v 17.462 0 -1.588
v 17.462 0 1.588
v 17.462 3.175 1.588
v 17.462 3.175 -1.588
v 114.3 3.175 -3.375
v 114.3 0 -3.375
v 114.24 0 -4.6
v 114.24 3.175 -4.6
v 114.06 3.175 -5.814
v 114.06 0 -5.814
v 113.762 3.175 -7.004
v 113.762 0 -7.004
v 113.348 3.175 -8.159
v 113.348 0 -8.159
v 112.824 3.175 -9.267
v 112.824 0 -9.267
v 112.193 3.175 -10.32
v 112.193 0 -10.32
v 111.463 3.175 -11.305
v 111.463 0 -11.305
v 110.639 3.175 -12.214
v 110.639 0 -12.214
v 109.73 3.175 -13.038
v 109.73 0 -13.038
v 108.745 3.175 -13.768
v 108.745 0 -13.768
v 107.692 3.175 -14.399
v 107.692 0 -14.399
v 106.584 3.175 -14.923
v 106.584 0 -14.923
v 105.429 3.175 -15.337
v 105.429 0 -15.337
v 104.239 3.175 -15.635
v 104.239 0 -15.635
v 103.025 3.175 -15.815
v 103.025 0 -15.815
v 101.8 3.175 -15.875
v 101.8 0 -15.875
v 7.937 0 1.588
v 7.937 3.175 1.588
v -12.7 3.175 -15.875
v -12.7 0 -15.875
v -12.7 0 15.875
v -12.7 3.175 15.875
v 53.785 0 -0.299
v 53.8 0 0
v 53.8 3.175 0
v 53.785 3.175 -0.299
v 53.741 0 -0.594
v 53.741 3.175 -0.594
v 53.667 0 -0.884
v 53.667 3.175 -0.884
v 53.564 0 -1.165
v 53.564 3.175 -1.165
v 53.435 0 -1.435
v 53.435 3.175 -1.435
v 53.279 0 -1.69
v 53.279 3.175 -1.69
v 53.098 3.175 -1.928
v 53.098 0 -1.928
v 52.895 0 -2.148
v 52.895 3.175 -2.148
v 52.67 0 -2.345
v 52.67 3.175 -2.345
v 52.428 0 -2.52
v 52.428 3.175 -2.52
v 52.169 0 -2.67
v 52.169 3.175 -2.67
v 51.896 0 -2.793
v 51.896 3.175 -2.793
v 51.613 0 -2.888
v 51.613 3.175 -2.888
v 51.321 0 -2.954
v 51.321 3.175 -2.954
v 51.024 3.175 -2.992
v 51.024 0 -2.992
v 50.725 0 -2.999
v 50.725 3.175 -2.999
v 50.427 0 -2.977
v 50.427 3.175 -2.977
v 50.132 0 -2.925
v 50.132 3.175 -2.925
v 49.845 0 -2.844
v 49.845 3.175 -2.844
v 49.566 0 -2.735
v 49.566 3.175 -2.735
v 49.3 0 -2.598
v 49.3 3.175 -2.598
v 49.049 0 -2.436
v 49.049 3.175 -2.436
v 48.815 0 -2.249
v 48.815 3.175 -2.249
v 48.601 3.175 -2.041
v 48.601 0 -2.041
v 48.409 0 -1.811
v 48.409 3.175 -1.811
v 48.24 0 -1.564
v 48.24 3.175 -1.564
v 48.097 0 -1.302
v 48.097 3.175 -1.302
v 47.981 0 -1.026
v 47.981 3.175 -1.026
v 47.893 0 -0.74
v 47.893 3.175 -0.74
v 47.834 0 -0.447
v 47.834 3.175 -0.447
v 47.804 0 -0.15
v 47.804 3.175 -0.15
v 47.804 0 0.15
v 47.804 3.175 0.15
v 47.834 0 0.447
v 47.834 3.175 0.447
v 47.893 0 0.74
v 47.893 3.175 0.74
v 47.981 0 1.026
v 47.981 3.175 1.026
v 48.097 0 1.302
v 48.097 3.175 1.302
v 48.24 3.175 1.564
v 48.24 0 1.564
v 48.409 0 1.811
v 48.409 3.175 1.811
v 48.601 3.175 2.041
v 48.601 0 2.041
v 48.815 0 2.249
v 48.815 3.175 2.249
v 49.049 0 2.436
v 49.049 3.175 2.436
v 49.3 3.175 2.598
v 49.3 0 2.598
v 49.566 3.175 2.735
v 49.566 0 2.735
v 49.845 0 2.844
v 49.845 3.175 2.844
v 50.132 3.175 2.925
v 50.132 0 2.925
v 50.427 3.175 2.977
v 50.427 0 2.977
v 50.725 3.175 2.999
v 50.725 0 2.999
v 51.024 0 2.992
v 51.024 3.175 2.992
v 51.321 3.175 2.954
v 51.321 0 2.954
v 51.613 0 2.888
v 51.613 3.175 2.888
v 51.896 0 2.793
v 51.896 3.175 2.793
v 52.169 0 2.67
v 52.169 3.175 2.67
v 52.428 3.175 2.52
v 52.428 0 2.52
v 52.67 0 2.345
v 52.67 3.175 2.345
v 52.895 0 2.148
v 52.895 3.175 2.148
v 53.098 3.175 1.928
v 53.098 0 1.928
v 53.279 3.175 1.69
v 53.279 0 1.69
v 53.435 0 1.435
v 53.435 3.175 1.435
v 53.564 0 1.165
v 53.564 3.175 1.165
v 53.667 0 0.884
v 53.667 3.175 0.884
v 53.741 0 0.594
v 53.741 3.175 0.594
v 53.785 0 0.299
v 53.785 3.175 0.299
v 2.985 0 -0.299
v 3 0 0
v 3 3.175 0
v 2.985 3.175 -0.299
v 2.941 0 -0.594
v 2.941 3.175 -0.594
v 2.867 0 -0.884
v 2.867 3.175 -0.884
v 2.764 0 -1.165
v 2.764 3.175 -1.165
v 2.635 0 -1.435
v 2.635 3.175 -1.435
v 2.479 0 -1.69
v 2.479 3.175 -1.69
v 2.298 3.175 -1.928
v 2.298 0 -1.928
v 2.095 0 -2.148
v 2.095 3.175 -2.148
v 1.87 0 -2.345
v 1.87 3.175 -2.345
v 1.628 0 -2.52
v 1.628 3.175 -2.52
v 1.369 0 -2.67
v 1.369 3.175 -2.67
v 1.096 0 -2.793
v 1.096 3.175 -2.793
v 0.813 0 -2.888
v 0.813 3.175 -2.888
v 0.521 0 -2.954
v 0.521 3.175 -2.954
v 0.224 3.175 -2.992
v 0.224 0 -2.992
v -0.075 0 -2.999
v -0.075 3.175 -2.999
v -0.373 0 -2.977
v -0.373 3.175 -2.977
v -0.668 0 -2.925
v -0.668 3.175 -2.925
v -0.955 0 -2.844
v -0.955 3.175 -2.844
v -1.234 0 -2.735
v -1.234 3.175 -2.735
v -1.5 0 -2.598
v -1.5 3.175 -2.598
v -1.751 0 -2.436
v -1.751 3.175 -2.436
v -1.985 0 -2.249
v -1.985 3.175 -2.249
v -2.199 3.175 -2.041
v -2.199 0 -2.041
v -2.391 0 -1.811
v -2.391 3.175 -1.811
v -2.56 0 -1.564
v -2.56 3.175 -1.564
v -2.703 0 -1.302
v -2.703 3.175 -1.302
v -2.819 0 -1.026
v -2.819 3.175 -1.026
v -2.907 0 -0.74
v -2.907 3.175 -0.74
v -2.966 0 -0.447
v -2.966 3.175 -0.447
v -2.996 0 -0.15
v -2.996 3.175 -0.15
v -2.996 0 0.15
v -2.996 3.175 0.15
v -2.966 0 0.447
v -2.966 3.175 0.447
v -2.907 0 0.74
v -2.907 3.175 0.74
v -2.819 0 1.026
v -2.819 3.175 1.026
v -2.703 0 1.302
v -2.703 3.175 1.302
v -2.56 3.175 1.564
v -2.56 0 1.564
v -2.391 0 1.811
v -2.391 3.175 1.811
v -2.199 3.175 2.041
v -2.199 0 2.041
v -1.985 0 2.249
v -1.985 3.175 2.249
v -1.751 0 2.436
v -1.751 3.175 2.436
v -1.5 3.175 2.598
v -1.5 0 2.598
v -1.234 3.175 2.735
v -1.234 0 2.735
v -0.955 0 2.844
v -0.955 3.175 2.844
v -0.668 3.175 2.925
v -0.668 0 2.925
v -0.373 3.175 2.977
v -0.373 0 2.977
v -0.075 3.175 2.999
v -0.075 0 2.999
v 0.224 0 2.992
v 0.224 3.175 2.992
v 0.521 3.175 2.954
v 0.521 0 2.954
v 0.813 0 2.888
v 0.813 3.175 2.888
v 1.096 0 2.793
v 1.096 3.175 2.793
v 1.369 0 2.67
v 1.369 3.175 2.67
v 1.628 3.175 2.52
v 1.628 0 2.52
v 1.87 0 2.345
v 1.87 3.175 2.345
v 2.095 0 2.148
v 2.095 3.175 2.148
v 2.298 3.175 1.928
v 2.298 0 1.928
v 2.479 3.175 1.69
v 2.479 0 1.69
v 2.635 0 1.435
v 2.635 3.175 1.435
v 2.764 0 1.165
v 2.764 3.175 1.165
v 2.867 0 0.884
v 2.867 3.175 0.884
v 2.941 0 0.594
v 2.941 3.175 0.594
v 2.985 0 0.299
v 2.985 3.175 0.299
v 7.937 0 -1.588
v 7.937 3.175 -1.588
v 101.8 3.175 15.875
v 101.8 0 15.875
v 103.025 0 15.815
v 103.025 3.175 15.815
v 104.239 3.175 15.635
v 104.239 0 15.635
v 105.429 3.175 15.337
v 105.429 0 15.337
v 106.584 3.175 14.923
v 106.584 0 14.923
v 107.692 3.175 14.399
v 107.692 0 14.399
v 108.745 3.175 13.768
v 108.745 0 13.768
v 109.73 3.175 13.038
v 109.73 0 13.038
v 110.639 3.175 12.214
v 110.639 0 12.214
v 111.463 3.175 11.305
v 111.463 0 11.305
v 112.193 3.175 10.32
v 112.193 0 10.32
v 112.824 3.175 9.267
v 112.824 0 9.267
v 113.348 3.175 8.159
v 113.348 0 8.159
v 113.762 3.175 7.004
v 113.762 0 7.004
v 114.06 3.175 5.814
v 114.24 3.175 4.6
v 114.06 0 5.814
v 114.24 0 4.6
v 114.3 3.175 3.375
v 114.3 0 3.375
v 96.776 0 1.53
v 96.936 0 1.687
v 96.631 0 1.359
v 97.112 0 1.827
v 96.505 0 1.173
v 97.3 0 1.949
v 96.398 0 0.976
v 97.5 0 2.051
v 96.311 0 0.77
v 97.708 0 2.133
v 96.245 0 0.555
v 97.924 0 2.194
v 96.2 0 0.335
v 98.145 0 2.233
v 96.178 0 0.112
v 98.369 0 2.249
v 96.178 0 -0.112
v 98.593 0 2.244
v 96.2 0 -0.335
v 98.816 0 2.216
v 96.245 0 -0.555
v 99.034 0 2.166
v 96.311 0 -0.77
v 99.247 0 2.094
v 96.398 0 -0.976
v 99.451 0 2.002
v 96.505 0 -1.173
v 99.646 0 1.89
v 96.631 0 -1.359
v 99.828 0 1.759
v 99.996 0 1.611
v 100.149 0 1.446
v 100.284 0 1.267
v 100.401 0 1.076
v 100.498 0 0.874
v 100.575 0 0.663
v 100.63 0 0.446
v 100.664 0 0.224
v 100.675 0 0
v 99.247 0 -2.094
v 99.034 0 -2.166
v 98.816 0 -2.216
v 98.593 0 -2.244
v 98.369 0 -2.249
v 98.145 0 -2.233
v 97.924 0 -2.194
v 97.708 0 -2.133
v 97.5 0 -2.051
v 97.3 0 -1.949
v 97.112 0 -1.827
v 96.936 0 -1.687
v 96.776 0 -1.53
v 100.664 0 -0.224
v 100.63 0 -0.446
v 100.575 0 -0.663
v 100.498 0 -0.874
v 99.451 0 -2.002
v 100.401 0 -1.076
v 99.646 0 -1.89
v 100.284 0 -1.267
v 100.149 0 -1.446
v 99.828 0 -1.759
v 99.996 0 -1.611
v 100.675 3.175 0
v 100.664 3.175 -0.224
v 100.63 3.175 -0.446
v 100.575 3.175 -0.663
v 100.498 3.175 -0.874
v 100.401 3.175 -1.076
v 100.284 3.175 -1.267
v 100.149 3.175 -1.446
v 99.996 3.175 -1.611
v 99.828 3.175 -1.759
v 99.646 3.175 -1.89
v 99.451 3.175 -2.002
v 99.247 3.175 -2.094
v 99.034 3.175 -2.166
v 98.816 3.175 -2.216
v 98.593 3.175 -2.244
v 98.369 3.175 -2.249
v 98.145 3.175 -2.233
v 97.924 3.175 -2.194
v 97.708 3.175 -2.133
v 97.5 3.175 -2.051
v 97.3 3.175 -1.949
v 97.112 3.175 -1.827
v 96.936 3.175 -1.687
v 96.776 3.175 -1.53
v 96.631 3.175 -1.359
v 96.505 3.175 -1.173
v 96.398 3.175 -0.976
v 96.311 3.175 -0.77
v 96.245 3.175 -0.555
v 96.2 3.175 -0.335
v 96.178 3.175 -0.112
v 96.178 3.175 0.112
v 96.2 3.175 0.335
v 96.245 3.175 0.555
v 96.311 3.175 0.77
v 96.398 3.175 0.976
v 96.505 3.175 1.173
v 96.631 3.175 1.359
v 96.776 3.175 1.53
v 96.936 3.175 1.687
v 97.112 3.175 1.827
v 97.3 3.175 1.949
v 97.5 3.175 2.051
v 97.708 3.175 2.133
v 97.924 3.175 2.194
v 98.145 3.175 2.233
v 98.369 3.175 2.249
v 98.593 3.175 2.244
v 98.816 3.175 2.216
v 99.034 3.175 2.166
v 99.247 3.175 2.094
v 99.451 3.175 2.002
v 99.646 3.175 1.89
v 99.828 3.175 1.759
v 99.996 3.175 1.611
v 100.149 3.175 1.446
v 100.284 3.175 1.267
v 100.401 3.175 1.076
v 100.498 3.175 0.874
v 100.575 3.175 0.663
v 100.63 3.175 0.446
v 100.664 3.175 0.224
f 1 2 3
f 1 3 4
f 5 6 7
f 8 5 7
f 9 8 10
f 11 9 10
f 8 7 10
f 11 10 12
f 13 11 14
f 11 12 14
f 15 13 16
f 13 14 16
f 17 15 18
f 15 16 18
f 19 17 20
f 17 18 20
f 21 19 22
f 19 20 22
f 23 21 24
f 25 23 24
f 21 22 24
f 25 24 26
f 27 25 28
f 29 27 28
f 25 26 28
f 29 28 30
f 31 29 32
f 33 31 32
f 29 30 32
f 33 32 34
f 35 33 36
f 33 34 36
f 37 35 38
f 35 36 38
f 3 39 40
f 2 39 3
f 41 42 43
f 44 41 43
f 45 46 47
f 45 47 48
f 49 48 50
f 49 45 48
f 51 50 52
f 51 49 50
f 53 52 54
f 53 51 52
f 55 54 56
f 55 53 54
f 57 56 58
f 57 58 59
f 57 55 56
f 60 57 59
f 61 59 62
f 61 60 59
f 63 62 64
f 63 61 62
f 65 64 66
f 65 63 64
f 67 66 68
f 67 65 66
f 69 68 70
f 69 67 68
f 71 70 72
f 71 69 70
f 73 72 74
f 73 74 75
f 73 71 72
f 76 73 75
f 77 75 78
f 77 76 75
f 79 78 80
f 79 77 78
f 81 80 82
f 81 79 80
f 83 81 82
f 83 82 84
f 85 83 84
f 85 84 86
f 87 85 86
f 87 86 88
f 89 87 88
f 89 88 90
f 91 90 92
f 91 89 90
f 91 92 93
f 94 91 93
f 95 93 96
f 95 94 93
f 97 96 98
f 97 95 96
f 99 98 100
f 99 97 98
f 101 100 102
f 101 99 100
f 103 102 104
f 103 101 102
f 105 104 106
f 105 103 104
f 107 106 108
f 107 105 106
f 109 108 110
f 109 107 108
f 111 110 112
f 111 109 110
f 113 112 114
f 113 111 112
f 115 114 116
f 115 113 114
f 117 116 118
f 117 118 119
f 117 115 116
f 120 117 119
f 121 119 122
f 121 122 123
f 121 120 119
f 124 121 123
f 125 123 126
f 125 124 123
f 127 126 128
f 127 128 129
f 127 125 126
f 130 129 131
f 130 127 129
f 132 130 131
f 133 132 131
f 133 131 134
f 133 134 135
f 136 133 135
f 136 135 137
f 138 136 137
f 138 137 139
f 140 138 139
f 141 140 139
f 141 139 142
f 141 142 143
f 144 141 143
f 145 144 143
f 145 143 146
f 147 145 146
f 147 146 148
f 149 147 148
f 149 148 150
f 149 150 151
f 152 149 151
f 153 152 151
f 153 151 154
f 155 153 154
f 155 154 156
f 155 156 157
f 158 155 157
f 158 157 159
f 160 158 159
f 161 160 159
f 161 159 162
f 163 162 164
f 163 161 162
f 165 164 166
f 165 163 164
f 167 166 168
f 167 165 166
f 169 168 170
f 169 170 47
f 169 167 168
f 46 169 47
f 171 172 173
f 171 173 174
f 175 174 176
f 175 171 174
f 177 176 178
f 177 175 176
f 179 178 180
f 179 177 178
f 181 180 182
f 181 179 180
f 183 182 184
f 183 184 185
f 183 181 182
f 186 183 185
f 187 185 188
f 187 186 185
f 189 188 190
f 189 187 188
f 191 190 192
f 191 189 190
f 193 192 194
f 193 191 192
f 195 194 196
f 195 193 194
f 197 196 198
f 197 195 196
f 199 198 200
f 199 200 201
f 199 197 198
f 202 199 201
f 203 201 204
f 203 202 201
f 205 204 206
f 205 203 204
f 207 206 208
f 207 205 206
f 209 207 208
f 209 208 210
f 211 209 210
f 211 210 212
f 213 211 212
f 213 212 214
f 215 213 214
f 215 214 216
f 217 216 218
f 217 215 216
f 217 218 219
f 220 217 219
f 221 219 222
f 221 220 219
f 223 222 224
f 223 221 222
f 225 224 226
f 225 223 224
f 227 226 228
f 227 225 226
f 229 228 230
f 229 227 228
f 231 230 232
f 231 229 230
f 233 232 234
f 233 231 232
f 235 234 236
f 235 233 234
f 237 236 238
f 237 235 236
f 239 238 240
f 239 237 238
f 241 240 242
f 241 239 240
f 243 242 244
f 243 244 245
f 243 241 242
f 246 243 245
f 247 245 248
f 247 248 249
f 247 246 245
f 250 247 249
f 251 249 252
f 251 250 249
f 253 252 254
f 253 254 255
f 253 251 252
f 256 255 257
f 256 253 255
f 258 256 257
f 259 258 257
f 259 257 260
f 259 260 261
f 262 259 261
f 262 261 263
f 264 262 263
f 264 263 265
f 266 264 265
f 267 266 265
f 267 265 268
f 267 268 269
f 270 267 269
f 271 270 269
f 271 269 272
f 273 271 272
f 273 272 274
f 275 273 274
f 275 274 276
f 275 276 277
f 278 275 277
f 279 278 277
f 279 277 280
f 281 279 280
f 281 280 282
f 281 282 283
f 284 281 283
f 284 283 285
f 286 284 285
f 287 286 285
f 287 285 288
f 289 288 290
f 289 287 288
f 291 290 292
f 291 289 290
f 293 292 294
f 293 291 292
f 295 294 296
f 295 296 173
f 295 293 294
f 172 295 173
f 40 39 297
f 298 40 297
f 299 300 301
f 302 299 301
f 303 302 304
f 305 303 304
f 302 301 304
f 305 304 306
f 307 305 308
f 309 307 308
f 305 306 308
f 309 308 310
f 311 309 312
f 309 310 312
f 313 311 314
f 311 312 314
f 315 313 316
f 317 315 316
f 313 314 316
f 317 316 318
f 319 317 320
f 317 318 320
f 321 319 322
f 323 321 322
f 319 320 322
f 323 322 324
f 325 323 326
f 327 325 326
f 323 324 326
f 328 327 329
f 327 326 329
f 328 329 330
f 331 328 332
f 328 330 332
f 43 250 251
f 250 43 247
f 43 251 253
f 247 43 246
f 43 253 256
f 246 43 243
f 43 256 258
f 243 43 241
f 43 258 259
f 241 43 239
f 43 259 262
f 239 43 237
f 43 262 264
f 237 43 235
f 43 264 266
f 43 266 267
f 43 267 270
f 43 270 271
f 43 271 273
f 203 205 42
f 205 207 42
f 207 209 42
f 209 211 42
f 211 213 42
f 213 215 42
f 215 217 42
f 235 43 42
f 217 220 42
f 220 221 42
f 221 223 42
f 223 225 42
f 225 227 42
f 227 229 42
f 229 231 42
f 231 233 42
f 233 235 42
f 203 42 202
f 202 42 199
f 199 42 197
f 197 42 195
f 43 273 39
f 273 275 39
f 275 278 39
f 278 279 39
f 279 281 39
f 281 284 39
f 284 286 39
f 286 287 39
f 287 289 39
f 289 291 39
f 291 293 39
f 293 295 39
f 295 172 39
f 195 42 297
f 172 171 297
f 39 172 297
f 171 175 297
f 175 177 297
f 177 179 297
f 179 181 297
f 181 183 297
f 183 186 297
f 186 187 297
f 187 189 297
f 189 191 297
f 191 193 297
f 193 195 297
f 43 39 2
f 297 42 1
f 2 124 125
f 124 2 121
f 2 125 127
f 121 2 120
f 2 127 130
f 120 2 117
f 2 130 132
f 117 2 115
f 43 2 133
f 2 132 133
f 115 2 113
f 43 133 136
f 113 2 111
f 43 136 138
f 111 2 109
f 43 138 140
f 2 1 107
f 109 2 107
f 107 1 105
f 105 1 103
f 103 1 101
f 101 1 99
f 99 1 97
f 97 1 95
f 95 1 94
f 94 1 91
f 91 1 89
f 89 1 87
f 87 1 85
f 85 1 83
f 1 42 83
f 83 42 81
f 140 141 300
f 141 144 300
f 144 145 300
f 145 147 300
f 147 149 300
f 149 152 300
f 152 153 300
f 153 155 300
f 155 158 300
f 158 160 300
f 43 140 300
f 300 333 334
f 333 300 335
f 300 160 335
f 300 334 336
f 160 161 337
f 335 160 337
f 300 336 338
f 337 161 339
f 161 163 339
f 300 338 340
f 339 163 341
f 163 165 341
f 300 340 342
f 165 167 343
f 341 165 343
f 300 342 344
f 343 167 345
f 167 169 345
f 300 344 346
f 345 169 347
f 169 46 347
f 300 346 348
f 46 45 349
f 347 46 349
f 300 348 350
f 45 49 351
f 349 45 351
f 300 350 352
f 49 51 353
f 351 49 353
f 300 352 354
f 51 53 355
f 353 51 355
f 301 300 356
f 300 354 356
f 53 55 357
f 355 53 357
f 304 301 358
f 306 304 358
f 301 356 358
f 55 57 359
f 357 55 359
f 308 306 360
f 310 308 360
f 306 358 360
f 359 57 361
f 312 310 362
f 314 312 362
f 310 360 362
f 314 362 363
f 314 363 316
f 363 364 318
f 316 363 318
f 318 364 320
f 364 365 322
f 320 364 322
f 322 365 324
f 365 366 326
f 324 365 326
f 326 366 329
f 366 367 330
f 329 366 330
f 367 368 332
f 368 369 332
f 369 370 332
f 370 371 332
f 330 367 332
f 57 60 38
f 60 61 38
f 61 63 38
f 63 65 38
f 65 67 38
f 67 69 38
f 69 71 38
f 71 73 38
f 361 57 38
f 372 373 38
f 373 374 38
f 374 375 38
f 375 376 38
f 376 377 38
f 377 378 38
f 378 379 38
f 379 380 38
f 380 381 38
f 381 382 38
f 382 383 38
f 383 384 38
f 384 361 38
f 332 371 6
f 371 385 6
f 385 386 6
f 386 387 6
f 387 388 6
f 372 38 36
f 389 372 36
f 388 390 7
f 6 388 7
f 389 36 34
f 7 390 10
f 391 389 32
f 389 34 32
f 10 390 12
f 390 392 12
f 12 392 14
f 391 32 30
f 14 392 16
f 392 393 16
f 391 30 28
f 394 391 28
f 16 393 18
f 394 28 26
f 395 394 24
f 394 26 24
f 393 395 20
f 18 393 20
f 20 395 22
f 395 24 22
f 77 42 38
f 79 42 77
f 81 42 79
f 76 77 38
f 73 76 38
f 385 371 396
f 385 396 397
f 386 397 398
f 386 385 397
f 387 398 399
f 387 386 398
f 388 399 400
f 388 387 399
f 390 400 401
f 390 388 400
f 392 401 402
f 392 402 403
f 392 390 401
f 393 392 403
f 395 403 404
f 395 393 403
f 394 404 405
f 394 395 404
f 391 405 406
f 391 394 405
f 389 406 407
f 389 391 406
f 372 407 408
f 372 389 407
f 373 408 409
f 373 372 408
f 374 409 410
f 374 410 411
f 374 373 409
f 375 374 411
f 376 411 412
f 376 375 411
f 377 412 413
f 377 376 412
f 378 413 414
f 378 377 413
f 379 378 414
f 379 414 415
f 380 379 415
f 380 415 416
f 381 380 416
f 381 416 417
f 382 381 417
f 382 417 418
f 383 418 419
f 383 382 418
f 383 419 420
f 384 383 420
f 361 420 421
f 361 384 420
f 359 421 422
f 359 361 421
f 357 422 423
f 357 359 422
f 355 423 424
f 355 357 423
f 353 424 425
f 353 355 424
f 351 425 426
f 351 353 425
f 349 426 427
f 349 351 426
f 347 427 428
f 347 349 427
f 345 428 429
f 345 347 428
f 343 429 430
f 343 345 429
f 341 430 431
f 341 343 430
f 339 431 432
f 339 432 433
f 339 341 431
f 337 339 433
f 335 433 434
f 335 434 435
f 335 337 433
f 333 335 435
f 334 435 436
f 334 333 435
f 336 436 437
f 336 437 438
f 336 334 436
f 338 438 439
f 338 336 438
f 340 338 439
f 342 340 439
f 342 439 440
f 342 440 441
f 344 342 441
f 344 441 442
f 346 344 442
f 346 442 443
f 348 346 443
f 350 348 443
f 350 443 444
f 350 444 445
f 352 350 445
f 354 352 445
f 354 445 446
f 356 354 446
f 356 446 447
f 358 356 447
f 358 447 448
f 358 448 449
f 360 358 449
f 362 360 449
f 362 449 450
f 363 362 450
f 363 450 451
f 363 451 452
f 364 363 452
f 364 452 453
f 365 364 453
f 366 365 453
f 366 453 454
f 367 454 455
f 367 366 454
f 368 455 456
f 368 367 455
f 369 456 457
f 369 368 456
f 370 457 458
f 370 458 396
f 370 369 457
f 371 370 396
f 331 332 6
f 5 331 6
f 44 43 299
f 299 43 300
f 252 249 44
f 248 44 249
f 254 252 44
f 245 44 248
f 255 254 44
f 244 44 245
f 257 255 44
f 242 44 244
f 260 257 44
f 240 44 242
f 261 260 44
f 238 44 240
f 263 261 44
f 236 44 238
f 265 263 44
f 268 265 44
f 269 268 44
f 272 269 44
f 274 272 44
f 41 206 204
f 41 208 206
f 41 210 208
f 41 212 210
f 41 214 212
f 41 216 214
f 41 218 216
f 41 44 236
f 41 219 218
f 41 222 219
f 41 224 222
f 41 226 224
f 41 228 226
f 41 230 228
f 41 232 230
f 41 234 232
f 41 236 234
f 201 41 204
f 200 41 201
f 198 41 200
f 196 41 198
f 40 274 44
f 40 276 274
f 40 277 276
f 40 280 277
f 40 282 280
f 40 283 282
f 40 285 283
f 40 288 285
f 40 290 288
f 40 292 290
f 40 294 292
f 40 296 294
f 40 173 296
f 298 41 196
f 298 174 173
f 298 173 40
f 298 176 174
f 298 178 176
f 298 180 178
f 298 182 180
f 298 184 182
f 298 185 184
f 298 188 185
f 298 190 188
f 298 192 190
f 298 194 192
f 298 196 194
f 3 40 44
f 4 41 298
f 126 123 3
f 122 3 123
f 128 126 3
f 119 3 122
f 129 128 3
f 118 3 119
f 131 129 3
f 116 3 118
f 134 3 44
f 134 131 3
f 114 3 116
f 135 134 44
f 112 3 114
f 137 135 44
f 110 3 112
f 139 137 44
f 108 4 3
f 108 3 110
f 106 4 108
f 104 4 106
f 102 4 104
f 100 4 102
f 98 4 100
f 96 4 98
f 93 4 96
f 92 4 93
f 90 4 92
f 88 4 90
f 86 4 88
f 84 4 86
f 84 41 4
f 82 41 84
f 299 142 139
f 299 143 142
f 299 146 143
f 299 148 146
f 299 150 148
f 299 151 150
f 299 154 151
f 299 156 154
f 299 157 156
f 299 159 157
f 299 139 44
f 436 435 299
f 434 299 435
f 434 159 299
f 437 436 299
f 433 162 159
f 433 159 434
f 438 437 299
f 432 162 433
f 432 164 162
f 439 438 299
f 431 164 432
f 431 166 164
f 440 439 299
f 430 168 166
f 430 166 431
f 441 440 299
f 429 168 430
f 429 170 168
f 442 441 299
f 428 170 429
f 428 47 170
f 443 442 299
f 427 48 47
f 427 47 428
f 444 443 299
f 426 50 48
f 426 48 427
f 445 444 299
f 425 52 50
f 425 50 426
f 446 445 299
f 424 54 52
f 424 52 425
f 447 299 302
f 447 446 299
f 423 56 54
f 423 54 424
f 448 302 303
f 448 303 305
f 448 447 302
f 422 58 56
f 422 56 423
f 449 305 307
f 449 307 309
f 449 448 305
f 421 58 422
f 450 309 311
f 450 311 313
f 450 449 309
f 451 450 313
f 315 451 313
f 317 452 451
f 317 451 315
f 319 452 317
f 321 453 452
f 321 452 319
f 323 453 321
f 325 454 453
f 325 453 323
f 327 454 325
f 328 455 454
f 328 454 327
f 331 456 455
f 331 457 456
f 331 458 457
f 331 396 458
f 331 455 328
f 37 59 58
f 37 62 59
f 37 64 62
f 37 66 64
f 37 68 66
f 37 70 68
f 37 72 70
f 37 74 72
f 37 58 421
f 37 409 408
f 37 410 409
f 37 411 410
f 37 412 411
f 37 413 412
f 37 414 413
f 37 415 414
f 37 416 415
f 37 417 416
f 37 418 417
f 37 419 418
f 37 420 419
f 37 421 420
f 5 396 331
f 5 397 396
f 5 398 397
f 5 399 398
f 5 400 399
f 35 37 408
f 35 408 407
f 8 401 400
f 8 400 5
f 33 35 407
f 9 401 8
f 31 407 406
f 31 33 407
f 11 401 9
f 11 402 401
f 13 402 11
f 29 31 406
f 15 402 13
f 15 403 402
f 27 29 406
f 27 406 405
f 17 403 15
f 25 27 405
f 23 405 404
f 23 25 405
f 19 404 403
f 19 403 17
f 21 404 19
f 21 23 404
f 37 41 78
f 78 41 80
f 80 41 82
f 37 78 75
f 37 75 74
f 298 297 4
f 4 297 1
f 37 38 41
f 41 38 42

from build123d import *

# Parameters (mm, degrees)
SKETCH1_R           = 3
SKETCH1_R_2         = 2.25
SKETCH1_W           = 9.525
SKETCH1_H           = 3.175
BOSS_EXTRUDE1_DEPTH = 3.175


with BuildPart() as part:
    # Sketch1 → Boss-Extrude1 (new body)
    with BuildSketch(Plane(origin=(0, 0, 0), x_dir=(1, 0, 0), z_dir=(0, 1, 0))):
        with BuildLine():
            Line((-12.7, -15.875), (101.8, -15.875))
            ThreePointArc((101.8, -15.875), (110.638834765, -12.213834765), (114.3, -3.375))
            Line((114.3, -3.375), (114.3, 3.375))
            ThreePointArc((114.3, 3.375), (110.638834765, 12.213834765), (101.8, 15.875))
            Line((101.8, 15.875), (-12.7, 15.875))
            Line((-12.7, 15.875), (-12.7, -15.875))
        make_face()
        Circle(SKETCH1_R, mode=Mode.SUBTRACT)
        with Locations((98.425, 0)):
            Circle(SKETCH1_R_2, mode=Mode.SUBTRACT)
        with Locations((50.8, 0)):
            Circle(SKETCH1_R, mode=Mode.SUBTRACT)
        with Locations((12.7, 0)):
            Rectangle(SKETCH1_W, SKETCH1_H, mode=Mode.SUBTRACT)
    extrude(amount=BOSS_EXTRUDE1_DEPTH)


solid = part.part
